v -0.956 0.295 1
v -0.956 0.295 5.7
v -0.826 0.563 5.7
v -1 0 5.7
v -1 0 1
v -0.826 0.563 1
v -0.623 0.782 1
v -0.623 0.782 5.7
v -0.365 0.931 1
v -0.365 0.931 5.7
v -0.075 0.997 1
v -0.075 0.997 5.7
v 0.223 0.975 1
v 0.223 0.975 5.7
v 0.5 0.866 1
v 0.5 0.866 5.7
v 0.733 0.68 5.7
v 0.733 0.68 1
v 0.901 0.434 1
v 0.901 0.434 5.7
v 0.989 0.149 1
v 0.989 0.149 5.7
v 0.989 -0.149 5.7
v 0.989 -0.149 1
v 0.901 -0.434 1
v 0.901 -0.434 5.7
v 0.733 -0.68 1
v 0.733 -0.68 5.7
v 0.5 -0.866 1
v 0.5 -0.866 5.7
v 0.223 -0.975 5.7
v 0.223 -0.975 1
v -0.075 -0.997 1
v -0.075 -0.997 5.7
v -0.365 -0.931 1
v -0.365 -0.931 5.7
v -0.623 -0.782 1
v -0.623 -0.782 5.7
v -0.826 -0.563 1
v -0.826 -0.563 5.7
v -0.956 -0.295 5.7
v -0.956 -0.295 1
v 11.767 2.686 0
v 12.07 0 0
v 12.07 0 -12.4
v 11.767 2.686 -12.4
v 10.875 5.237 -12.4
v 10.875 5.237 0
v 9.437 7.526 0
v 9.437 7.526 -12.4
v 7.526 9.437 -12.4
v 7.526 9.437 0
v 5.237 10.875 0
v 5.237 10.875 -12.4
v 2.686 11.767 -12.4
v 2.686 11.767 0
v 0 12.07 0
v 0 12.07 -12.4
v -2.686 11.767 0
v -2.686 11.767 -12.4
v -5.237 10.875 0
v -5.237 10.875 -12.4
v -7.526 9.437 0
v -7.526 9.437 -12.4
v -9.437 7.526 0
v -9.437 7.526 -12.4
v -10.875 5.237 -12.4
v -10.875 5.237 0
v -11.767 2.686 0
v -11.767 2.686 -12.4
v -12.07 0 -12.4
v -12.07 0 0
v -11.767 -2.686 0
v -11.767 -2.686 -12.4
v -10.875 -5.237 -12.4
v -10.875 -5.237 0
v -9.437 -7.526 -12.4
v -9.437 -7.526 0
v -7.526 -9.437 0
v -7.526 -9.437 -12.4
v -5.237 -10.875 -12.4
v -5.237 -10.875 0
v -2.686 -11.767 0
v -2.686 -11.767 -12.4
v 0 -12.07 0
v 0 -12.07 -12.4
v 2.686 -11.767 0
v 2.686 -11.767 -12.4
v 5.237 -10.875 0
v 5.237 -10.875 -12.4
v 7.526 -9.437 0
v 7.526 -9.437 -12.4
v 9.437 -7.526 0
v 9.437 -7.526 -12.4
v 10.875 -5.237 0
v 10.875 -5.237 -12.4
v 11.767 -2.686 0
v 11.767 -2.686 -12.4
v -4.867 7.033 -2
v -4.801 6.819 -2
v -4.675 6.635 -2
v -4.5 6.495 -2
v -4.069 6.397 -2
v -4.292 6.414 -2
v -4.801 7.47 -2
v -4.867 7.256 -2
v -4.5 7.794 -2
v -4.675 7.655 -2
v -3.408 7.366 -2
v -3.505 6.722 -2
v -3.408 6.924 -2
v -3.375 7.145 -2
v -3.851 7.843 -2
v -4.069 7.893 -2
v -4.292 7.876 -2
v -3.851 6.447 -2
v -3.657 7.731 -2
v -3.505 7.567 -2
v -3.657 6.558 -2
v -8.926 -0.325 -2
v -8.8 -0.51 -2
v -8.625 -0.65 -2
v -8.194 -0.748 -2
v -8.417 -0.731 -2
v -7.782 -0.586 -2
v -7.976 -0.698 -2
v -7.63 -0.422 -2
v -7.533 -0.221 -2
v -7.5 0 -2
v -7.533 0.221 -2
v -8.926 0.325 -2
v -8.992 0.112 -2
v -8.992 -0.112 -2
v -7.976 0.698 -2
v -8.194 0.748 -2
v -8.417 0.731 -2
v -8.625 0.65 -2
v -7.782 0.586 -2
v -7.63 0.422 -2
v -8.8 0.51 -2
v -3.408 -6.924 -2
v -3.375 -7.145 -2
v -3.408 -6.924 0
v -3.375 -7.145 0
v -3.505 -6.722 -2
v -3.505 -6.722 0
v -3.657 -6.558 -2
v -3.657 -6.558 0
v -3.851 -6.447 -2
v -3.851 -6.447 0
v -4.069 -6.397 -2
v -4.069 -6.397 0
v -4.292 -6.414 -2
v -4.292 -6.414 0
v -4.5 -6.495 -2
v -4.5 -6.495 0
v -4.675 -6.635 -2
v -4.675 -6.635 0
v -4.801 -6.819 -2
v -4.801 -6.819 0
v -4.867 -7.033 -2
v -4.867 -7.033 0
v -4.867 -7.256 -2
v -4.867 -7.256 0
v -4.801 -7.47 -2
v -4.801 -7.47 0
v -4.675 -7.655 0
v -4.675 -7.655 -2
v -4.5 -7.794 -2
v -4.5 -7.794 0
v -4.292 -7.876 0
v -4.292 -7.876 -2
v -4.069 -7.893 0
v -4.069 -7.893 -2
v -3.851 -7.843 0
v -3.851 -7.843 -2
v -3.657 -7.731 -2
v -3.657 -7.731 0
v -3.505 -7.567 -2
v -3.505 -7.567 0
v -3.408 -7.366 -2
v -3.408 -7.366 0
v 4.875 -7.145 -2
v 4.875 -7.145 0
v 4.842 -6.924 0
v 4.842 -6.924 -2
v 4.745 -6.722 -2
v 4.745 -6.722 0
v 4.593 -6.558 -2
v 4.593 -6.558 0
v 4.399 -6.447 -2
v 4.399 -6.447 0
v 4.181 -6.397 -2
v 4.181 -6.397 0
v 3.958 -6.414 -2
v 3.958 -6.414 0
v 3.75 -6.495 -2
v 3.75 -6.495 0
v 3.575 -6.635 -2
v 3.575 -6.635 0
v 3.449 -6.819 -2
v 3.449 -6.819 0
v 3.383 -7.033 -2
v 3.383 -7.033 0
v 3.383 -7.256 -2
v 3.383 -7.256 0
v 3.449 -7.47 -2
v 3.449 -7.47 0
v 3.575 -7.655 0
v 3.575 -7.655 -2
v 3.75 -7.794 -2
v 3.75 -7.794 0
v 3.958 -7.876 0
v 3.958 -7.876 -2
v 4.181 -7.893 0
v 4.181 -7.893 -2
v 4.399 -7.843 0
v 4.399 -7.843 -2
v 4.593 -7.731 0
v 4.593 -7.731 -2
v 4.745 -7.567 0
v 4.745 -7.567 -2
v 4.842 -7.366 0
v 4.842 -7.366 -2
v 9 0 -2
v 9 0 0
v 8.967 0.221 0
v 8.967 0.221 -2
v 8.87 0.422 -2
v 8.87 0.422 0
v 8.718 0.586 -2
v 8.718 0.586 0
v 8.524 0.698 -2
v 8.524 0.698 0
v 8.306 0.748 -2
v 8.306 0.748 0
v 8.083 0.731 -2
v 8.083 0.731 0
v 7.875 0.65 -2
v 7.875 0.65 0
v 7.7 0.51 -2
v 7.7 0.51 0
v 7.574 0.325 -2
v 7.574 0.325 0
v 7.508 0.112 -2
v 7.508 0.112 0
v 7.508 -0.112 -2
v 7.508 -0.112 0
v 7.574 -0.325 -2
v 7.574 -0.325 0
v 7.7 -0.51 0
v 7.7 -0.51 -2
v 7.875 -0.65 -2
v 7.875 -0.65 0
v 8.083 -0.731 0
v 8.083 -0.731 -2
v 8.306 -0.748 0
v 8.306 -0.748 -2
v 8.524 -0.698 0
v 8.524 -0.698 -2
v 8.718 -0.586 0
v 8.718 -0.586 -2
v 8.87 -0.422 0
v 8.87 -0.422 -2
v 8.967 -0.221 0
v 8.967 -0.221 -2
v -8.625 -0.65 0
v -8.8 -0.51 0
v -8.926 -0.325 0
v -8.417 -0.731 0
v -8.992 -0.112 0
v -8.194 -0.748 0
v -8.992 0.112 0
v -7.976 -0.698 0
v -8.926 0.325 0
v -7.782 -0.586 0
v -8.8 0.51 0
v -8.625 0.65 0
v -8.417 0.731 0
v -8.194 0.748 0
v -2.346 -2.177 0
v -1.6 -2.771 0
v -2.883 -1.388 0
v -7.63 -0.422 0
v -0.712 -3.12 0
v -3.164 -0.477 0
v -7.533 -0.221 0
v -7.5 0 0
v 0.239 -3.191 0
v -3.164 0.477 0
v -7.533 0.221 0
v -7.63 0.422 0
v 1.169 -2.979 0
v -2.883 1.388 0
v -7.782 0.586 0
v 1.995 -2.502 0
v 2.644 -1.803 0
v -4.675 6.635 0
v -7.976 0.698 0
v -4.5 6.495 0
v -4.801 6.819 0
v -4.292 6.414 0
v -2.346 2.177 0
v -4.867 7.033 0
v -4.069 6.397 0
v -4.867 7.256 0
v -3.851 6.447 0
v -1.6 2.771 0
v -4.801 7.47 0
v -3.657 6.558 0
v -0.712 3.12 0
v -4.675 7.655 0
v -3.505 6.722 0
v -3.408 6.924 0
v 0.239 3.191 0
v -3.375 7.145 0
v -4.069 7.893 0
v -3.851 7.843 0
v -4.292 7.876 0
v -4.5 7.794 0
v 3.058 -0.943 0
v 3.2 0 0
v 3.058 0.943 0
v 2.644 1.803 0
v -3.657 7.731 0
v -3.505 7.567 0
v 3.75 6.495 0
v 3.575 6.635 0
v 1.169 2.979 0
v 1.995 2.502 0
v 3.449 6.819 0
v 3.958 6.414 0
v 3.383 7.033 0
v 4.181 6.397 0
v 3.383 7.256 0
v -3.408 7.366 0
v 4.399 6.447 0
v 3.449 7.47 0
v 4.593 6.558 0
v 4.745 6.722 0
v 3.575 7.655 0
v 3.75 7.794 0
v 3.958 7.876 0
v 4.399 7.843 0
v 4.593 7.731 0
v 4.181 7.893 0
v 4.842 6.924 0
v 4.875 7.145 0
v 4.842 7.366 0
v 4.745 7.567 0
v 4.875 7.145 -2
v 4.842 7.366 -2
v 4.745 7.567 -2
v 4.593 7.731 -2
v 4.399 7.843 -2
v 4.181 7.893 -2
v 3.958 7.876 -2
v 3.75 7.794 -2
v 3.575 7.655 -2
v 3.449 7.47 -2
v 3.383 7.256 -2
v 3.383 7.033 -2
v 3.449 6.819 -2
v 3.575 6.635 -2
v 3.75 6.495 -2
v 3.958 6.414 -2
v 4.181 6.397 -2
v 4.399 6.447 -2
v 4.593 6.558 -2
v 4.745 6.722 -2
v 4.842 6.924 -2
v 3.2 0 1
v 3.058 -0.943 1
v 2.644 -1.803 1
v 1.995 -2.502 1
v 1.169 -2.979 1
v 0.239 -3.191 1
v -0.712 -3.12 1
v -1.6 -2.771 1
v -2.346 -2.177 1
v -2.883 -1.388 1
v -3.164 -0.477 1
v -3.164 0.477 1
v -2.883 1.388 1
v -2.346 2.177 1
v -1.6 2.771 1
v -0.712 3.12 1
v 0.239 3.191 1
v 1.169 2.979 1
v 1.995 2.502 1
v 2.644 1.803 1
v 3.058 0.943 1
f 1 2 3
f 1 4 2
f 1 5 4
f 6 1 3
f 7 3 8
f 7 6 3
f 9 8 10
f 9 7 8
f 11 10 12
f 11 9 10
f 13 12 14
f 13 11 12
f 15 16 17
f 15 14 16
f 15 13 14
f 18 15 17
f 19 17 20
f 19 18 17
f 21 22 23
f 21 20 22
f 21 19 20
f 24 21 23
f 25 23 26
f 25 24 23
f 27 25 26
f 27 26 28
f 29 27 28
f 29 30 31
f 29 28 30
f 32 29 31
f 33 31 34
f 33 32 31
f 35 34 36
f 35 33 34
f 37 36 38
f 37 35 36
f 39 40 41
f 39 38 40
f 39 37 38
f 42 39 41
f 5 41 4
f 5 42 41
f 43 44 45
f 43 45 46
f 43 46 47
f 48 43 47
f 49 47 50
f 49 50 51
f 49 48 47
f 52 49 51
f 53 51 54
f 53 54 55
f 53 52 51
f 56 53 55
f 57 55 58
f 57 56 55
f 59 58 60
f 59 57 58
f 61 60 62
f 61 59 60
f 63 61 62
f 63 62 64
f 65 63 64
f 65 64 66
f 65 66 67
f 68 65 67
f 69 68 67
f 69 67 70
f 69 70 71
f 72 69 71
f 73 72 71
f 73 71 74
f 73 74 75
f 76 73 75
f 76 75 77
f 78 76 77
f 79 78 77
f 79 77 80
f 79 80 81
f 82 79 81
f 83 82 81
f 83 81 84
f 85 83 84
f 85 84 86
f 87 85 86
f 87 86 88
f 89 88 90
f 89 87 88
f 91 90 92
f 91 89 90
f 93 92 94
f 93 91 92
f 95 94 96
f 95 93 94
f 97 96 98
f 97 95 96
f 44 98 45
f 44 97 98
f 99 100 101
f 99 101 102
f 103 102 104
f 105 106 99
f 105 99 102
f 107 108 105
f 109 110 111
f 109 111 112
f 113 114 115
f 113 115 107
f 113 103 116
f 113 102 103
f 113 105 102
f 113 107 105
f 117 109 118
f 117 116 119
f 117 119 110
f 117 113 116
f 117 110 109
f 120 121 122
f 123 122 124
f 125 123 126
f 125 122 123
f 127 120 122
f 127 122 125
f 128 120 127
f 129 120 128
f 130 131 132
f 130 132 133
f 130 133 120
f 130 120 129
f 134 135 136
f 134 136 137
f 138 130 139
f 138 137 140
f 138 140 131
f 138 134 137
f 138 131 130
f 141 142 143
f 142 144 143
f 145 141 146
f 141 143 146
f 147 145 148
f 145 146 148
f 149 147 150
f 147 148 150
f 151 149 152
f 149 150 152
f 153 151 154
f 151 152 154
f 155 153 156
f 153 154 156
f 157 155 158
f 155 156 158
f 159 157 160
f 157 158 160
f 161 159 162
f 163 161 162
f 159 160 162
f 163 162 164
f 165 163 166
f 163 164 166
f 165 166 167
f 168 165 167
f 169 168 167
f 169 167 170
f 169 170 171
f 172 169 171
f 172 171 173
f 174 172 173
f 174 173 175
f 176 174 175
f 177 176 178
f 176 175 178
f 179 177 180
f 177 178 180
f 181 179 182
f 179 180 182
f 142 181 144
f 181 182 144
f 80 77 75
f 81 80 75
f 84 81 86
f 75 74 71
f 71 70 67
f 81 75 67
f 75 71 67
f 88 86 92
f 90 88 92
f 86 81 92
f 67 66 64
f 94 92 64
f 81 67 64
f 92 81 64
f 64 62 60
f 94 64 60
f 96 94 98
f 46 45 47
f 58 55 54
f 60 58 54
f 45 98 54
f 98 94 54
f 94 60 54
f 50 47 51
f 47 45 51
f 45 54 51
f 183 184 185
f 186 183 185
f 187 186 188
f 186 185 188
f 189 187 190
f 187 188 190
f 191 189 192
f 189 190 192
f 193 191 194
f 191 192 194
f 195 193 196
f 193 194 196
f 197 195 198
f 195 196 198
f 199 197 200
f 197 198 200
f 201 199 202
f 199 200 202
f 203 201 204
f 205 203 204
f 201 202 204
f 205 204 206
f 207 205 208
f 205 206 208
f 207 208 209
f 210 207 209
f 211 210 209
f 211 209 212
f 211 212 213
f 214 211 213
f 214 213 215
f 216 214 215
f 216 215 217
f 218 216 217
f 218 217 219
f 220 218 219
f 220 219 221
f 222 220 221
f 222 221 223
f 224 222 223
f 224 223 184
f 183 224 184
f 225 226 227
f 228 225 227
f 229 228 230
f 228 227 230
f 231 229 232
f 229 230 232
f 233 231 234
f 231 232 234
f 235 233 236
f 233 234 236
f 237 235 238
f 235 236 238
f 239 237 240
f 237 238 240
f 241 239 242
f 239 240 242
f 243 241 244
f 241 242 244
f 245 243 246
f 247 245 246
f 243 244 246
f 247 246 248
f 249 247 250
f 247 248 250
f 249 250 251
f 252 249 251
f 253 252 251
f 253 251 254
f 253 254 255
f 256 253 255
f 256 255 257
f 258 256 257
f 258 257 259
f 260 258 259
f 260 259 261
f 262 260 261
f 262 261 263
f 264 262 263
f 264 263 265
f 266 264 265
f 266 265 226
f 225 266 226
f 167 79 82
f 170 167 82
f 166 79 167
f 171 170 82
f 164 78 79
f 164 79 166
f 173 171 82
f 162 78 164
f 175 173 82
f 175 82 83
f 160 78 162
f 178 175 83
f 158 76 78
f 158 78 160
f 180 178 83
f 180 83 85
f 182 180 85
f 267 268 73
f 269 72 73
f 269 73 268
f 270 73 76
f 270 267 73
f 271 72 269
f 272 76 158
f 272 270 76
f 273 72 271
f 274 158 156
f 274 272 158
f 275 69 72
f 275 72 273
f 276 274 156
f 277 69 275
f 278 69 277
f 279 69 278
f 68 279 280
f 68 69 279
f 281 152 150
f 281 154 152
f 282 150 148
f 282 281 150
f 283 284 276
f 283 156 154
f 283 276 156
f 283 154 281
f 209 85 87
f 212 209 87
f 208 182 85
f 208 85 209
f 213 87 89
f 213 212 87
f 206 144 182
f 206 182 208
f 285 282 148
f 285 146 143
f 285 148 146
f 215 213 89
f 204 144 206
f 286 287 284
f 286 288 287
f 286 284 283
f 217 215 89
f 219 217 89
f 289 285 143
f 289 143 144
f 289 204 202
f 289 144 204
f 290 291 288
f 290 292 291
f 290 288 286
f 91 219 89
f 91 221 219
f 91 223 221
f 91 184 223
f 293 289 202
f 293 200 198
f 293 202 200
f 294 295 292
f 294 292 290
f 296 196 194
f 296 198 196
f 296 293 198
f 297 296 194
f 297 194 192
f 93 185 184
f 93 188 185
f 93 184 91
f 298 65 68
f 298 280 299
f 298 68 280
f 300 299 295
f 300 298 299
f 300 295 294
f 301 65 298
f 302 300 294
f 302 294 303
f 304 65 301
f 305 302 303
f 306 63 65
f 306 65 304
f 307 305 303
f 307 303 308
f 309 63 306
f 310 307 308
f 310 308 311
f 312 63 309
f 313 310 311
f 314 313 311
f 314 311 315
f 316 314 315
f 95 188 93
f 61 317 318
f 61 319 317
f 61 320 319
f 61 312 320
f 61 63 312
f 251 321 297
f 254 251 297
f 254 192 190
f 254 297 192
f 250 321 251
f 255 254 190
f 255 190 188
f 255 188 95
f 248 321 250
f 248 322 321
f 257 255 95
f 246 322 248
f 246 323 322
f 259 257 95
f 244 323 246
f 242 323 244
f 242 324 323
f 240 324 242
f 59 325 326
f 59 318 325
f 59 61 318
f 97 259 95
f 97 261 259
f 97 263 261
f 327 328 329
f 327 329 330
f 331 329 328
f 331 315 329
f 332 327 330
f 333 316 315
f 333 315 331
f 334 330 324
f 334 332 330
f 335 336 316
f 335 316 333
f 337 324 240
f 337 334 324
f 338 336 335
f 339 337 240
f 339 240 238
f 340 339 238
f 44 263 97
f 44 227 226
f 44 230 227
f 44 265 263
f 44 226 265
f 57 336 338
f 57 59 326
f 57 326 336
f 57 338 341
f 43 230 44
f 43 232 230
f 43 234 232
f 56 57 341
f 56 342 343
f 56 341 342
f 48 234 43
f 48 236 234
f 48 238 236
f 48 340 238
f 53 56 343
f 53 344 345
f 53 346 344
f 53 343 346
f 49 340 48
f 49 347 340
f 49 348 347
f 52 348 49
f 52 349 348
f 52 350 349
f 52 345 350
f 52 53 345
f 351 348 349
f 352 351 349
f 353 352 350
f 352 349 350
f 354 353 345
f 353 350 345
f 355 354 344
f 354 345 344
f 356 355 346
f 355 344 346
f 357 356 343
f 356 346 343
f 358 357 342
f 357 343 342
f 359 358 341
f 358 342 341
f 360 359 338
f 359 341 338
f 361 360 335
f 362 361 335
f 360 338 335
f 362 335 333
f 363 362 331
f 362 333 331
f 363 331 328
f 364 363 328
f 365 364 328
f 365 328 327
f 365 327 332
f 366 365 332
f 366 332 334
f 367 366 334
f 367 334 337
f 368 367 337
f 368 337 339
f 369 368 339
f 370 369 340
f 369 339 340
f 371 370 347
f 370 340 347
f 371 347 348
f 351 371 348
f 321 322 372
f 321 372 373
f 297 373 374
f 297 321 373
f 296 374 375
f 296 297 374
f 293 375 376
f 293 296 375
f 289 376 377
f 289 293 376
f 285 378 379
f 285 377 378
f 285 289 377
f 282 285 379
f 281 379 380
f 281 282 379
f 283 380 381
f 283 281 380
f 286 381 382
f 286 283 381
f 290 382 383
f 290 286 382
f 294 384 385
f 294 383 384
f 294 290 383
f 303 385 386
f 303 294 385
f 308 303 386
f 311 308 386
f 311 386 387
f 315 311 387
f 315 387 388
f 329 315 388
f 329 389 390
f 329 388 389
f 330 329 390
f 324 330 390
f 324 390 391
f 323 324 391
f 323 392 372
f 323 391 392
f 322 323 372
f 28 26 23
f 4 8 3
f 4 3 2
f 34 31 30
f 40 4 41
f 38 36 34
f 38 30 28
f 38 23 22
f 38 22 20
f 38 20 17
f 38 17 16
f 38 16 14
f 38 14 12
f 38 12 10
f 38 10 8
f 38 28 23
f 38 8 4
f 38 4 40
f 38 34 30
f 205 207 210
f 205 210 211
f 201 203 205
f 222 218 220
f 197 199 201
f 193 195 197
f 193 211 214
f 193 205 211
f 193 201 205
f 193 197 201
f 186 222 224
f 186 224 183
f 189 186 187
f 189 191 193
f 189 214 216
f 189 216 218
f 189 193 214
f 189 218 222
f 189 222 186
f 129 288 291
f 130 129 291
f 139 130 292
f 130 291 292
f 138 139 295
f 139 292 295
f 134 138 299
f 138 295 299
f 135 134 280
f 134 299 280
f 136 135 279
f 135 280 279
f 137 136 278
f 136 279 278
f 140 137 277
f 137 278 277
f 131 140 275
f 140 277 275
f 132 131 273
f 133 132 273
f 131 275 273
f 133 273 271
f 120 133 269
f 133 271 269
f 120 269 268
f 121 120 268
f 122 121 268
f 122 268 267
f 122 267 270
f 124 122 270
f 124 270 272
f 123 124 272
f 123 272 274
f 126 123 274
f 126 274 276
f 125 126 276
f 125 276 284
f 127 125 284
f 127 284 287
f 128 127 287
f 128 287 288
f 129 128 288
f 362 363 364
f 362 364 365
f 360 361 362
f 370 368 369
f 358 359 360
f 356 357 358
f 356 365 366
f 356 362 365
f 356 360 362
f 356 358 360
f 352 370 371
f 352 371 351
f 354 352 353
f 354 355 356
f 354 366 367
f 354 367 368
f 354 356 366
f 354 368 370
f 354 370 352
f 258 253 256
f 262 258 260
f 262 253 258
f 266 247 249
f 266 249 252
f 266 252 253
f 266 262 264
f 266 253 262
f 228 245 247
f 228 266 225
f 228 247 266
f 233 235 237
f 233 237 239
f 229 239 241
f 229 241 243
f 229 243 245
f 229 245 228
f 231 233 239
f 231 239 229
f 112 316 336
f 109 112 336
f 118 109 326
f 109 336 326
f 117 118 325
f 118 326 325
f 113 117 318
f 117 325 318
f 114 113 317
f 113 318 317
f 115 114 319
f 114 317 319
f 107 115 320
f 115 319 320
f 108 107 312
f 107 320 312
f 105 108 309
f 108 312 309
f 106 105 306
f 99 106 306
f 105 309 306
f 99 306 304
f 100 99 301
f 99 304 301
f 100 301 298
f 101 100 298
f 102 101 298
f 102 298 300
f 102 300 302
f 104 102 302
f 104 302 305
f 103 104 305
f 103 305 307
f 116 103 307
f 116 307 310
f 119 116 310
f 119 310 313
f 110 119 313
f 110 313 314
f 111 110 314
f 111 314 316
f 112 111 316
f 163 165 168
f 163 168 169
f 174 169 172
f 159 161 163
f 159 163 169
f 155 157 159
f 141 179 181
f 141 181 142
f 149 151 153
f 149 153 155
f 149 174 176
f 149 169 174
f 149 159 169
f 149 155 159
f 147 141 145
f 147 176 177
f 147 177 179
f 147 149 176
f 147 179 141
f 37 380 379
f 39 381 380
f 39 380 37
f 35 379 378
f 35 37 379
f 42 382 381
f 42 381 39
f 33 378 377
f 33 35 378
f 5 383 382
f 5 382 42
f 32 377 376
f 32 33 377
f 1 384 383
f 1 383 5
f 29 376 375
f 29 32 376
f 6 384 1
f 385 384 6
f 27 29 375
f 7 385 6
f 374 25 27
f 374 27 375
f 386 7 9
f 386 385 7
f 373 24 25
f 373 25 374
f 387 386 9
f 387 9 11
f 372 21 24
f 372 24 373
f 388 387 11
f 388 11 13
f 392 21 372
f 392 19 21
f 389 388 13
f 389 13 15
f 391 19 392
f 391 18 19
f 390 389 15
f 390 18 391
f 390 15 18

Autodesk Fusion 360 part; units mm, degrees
sketch "Sketch1" plane through (0, 0, 0) normal (0, 0, 1) x (1, 0, 0)
  circle A0 centre (0, 0) radius 12.07
  circle A1 centre (0, 0) radius 3.2
  dimension "d1" = 24.14
  dimension "d2" = 6.4
extrude "Extrude1" add sketch "Sketch1" against normal blind 12.4 contours A0 | A1
extrude "Extrude2" add sketch "Sketch1" along normal blind 1 contours A1
sketch "Sketch2" plane through (0, 0, 1) normal (0, 0, 1) x (-1, 0, 0)
  circle A0 centre (0, 0) radius 3.2
  circle A1 centre (0, 0) radius 1
  dimension "d7" = 2
extrude "Extrude3" add sketch "Sketch2" along normal blind 4.7 contours A1
sketch "Sketch3" plane through (0, 0, 0) normal (0, 0, 1) x (1, 0, 0)
  line L0 (0, 0) -> (-8.25, 0) construction
  circle A0 centre (-8.25, 0) radius 0.75
  circle A1 centre (-4.125, -7.1447) radius 0.75
  circle A2 centre (4.125, -7.1447) radius 0.75
  circle A3 centre (8.25, 0) radius 0.75
  circle A4 centre (4.125, 7.1447) radius 0.75
  circle A5 centre (-4.125, 7.1447) radius 0.75
  dimension "d10" = 8.25
  dimension "d11" = 1.5
  dimension "d13" = 360
extrude "Extrude4" cut sketch "Sketch3" against normal blind 2
